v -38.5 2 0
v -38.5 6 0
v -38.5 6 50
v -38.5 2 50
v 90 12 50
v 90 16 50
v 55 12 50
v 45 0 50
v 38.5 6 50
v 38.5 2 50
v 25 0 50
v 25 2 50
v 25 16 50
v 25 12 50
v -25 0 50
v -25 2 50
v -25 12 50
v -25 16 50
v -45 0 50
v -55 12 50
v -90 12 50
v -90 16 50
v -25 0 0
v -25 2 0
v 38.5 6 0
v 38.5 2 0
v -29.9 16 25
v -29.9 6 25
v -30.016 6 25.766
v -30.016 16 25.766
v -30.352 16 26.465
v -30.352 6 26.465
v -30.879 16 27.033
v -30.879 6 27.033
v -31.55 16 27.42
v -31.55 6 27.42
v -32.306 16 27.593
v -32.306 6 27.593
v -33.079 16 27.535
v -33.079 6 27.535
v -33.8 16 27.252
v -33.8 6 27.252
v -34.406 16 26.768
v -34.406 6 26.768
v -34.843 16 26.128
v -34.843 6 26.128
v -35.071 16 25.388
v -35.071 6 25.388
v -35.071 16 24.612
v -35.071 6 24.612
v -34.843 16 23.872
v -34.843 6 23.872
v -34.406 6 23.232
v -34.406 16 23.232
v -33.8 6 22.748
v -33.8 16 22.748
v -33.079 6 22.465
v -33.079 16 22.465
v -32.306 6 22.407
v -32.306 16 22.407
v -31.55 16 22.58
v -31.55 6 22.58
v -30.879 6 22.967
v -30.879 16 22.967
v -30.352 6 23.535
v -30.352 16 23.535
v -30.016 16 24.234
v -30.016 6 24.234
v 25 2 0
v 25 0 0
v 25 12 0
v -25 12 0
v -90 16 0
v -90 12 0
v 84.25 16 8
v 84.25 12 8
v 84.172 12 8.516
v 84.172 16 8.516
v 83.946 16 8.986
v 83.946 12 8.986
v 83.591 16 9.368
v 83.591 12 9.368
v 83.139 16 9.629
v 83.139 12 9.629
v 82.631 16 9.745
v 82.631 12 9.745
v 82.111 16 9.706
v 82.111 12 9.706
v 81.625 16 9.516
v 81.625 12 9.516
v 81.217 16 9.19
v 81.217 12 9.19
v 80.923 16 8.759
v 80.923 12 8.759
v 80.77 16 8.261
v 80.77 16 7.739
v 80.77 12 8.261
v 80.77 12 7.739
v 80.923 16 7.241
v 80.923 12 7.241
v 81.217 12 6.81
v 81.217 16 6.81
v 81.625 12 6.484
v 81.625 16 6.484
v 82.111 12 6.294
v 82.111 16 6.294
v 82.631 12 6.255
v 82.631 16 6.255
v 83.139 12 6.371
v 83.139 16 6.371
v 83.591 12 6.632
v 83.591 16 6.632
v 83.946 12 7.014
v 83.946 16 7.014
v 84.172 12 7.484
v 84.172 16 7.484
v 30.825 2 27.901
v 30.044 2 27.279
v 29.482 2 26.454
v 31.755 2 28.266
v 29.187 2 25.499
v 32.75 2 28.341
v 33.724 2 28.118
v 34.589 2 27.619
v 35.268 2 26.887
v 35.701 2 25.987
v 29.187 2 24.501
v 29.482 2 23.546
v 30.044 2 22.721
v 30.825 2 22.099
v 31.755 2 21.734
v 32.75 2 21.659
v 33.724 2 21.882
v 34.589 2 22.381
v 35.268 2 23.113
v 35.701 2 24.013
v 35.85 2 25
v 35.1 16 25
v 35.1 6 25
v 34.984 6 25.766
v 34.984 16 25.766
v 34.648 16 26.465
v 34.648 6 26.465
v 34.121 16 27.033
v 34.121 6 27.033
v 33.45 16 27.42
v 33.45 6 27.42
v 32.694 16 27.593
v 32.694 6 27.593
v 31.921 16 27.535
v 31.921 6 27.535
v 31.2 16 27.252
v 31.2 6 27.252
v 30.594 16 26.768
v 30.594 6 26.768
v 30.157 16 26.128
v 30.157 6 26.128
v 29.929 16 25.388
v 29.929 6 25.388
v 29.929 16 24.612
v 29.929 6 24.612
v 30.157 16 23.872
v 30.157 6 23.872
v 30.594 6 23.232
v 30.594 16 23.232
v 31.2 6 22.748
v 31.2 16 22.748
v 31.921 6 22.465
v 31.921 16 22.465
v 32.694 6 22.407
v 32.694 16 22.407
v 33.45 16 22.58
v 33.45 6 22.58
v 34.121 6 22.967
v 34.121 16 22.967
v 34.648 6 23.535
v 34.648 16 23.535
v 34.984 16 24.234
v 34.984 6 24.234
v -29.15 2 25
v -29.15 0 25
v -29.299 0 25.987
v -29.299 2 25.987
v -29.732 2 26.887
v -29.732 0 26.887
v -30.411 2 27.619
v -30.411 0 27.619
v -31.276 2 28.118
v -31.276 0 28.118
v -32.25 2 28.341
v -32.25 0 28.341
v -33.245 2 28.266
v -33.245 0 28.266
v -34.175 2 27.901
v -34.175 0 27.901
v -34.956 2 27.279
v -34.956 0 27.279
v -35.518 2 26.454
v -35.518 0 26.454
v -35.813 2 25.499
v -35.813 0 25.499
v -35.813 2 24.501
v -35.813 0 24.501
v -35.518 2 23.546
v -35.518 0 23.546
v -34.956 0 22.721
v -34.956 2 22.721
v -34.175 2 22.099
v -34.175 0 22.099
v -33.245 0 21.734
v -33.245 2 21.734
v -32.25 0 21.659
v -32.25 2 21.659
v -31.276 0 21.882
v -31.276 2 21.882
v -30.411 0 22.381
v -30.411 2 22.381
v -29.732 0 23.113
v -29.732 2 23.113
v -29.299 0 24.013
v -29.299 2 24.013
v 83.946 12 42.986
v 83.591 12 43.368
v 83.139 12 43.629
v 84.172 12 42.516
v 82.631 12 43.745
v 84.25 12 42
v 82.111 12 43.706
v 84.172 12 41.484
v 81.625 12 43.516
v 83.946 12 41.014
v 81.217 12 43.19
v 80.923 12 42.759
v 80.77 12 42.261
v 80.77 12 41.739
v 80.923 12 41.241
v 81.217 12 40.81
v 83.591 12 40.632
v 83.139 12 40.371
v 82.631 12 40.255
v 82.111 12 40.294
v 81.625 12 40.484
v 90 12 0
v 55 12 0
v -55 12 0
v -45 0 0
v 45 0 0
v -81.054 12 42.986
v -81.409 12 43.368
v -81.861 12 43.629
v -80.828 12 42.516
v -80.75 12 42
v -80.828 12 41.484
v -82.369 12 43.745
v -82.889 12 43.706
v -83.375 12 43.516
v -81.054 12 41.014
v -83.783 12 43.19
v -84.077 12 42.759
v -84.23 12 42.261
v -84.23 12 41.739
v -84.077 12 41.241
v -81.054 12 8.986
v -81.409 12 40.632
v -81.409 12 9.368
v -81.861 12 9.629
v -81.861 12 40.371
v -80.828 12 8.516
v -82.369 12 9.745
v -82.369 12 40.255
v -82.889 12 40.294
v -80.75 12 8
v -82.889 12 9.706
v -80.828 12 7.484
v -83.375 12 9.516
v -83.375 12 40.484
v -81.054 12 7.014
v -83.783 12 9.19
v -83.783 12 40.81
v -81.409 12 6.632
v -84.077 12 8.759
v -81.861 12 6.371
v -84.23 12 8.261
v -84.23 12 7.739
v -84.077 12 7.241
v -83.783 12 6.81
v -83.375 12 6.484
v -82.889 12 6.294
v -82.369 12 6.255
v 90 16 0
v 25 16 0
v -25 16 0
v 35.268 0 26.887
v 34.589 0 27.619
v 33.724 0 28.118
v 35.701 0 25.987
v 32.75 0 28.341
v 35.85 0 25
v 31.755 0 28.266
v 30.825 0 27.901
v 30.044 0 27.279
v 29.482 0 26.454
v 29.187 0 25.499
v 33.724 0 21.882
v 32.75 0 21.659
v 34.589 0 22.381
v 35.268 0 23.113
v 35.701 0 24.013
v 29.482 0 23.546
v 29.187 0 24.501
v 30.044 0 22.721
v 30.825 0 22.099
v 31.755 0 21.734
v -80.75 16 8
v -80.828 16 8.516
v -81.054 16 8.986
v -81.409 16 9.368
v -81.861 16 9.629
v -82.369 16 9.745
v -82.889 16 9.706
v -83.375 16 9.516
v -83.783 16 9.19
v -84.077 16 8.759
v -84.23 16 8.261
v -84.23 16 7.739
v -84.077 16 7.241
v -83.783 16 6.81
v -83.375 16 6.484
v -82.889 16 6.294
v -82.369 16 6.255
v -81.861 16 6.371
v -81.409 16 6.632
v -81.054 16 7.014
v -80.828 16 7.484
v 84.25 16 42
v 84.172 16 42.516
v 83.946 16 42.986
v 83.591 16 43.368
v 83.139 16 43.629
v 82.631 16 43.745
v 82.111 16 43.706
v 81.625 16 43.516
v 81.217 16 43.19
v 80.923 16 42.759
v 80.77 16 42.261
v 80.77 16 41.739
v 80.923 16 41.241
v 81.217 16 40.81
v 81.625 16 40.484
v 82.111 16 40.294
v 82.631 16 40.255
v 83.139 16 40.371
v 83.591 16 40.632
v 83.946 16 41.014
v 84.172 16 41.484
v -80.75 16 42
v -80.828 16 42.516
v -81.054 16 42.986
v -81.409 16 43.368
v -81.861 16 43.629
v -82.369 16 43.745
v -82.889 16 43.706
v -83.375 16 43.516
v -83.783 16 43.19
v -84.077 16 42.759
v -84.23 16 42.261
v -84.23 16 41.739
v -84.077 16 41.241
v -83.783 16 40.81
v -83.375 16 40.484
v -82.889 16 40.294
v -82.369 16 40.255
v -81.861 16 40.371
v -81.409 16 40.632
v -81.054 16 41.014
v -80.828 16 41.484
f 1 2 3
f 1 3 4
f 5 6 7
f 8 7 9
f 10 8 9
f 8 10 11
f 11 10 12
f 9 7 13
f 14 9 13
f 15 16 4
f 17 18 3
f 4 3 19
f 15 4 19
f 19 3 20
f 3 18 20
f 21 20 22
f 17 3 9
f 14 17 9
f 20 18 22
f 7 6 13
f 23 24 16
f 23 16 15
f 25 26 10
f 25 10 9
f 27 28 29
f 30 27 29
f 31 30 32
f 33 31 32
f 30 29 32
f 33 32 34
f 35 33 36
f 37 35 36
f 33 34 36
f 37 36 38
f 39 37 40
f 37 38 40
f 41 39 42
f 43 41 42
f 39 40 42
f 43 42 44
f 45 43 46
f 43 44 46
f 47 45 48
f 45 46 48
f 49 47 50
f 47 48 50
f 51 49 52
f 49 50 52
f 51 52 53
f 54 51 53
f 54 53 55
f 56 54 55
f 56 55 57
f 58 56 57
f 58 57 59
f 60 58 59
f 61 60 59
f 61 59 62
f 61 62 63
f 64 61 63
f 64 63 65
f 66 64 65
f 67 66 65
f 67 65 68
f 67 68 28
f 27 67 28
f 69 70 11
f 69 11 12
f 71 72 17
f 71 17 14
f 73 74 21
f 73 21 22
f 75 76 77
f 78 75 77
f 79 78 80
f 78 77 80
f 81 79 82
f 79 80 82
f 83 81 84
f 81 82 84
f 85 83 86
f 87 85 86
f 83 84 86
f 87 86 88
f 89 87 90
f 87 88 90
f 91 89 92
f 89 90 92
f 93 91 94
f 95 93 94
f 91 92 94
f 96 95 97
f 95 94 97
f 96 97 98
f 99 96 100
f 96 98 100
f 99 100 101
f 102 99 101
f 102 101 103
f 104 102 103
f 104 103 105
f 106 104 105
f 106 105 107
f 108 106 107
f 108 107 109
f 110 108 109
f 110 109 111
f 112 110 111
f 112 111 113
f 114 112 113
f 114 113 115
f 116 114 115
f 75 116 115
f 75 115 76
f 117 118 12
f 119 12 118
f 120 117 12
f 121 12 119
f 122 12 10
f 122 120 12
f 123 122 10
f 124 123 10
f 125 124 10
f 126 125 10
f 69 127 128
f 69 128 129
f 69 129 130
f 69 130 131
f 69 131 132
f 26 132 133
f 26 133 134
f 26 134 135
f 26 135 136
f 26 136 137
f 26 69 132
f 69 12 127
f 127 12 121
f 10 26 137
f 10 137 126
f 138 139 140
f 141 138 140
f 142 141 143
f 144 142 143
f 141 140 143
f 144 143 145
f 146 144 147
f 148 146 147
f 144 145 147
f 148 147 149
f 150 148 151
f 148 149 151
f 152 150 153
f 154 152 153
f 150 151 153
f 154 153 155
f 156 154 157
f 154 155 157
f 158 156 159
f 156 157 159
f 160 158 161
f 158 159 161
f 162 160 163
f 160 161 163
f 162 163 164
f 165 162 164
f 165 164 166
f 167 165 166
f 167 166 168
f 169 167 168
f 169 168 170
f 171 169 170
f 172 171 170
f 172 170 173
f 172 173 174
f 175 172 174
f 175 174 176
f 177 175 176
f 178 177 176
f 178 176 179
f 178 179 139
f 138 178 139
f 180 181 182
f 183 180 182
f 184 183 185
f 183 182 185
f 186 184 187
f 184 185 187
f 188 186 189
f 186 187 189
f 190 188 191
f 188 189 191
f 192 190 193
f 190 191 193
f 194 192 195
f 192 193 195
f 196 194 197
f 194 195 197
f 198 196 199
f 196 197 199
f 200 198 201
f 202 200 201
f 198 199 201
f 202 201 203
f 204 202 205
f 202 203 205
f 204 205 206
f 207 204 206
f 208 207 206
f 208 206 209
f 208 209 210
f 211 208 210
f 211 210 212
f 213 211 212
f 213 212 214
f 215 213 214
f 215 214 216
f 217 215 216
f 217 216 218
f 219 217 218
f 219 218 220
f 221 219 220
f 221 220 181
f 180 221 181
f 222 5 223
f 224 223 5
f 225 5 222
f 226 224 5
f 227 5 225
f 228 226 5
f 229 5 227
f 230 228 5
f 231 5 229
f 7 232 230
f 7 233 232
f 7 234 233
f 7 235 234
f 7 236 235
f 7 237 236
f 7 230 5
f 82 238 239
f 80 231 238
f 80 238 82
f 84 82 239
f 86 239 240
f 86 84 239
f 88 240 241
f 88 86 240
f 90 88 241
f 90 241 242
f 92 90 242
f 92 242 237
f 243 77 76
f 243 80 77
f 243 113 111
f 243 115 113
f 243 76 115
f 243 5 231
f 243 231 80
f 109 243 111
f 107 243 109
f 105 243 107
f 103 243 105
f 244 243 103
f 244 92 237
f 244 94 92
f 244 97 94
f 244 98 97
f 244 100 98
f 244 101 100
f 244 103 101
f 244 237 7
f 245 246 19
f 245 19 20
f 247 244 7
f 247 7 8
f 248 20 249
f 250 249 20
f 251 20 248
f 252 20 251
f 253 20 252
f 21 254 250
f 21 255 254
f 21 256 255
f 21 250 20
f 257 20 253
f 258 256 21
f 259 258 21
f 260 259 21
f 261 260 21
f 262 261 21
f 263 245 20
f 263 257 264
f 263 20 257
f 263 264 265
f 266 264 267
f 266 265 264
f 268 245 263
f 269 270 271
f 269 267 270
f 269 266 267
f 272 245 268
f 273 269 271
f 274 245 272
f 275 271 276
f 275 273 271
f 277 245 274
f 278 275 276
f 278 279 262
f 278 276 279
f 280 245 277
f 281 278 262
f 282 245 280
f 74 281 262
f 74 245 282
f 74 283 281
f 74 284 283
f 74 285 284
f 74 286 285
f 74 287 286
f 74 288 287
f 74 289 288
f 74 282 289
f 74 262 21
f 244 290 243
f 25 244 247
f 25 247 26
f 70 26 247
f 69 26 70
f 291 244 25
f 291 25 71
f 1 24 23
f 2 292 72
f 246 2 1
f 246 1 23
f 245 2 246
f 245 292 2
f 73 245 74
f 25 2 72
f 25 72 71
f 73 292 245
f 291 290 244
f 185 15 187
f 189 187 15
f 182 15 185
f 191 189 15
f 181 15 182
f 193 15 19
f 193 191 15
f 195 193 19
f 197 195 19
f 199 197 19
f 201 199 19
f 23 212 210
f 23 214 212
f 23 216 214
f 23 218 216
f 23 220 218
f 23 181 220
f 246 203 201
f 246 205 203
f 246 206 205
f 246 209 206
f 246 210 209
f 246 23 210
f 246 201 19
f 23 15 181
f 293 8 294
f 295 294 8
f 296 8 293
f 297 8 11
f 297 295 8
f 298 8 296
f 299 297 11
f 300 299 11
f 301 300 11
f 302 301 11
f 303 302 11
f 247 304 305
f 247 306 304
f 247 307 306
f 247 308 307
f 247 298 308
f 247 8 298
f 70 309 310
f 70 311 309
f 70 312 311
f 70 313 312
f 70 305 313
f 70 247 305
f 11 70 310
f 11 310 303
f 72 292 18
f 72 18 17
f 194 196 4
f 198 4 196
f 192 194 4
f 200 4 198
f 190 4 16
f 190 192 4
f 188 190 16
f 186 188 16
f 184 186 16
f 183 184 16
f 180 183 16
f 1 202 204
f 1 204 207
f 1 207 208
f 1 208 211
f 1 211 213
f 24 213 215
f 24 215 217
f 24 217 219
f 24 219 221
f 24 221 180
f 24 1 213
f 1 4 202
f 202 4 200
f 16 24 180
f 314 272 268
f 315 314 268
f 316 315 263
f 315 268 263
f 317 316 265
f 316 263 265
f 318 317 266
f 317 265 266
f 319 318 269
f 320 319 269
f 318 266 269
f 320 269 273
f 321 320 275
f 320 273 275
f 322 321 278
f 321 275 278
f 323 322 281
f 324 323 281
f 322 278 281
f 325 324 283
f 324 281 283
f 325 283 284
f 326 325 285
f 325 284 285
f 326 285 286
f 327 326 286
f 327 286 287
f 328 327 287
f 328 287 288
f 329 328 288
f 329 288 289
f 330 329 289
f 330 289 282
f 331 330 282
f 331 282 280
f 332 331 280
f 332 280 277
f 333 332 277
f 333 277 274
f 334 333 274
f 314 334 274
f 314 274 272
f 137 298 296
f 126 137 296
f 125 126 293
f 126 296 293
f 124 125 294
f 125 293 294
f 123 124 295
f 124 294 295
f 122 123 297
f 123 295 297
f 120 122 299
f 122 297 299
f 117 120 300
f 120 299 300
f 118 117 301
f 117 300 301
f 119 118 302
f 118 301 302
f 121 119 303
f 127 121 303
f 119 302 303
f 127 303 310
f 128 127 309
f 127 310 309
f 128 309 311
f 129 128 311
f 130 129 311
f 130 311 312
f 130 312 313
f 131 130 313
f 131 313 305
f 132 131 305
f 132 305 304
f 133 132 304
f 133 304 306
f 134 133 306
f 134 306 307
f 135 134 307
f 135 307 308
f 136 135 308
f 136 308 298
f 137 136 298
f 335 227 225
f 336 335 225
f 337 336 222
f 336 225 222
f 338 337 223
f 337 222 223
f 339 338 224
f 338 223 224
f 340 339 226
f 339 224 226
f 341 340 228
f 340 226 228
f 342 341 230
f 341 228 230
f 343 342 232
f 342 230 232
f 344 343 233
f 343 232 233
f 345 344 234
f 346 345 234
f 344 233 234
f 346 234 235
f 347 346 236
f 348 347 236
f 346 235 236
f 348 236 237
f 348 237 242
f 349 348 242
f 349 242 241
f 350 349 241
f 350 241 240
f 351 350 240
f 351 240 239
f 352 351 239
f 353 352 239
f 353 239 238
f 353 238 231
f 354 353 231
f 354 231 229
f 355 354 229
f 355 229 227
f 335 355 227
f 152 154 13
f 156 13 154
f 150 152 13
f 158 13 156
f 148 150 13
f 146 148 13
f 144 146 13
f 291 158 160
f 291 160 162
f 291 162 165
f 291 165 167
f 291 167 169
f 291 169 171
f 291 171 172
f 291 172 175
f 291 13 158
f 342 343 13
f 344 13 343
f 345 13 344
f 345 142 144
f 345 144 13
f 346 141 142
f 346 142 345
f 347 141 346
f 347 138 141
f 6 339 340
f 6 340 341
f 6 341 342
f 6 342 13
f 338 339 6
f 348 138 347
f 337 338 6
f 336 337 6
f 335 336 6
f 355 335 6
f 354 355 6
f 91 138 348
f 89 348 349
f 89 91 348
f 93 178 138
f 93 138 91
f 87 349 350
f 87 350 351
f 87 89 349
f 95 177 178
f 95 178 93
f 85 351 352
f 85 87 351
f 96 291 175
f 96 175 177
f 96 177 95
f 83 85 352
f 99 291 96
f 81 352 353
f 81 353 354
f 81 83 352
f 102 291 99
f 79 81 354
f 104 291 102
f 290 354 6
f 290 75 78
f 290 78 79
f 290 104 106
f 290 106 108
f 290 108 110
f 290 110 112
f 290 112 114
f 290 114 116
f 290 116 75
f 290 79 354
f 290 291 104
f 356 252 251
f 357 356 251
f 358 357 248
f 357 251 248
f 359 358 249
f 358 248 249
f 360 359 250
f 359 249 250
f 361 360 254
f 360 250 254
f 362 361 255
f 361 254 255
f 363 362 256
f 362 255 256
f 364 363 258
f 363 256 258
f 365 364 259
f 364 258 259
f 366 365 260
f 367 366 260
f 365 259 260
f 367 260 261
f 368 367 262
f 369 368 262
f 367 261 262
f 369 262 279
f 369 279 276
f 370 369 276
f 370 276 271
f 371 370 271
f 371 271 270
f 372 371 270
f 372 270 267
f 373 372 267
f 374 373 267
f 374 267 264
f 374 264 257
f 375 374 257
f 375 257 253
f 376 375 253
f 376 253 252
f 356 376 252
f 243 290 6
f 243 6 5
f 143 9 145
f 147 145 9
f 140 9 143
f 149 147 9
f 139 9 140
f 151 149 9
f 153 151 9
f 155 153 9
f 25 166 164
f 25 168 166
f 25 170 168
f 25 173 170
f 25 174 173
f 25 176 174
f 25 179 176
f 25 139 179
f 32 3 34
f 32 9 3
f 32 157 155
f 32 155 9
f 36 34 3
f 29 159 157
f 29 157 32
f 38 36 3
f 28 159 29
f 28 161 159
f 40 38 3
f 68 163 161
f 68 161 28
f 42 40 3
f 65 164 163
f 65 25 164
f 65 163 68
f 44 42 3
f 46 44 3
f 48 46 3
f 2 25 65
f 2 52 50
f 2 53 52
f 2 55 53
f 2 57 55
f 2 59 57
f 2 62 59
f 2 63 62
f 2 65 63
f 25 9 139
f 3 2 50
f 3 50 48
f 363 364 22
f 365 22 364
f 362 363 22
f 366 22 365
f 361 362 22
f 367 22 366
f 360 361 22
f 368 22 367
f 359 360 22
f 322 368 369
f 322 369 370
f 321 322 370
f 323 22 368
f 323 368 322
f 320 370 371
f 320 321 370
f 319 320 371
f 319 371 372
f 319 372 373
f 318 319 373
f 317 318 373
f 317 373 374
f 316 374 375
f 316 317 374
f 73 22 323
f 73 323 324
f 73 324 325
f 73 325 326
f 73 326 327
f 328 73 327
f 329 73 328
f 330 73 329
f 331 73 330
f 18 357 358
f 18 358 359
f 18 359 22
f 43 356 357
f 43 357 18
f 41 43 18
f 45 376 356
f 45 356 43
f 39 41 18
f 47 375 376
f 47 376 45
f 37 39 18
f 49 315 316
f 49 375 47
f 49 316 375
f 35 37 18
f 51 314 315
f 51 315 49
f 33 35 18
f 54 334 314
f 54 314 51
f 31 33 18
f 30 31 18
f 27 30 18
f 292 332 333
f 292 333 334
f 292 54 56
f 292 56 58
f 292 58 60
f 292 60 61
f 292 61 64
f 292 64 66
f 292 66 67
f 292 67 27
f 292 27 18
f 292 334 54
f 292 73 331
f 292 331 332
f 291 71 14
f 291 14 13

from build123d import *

# Parameters (mm, degrees)
SKETCH001_AS_DRAWN_R                 = 1.75
SKETCH001_AS_DRAWN_R_2               = 2.6
EXTRUDE003_DEPTH                     = 25
EXTRUDE003_ONTO_SKETCH001_ROLL_ANGLE = 90
SKETCH002_AS_DRAWN_R                 = 3.35
EXTRUDE002_DEPTH                     = 3
EXTRUDE002_ONTO_SKETCH002_ROLL_ANGLE = 90
EXTRUDE_DEPTH                        = 50


with BuildPart() as extrude003:
    # Sketch001 as drawn → Extrude003 (new)
    with BuildSketch(Plane.XY):
        with Locations((-82.5, -17)):
            Circle(SKETCH001_AS_DRAWN_R)
        with Locations((82.5, 17)):
            Circle(SKETCH001_AS_DRAWN_R)
        with Locations((82.5, -17)):
            Circle(SKETCH001_AS_DRAWN_R)
        with Locations((-32.5, 0)):
            Circle(SKETCH001_AS_DRAWN_R_2)
        with Locations((32.5, 0)):
            Circle(SKETCH001_AS_DRAWN_R_2)
        with Locations((-82.5, 17)):
            Circle(SKETCH001_AS_DRAWN_R)
    extrude(amount=-EXTRUDE003_DEPTH)


with BuildPart() as extrude003_1:
    # Extrude003 onto Sketch001 roll: moved
    add(extrude003.part.rotate(Axis((0, 0, 0), (1, 0, 0)), EXTRUDE003_ONTO_SKETCH001_ROLL_ANGLE))


with BuildPart() as extrude003_2:
    # Extrude003 onto Sketch001 placement: moved
    add(extrude003_1.part.moved(Location((0, 0, 25))))


with BuildPart() as fusion:
    # Sketch002 as drawn → Extrude002 (new)
    with BuildSketch(Plane.XY):
        with Locations((-32.5, 0)):
            Circle(SKETCH002_AS_DRAWN_R)
        with Locations((32.5, 0)):
            Circle(SKETCH002_AS_DRAWN_R)
    extrude(amount=-EXTRUDE002_DEPTH)


with BuildPart() as fusion_1:
    # Extrude002 onto Sketch002 roll: moved
    add(fusion.part.rotate(Axis((0, 0, 0), (1, 0, 0)), EXTRUDE002_ONTO_SKETCH002_ROLL_ANGLE))


with BuildPart() as fusion_2:
    # Extrude002 onto Sketch002 placement: moved
    add(fusion_1.part.moved(Location((0, 0, 25))))

    # Fusion: union Extrude003
    add(extrude003_2.part)


with BuildPart() as cut:
    # Sketch → Extrude (new body)
    with BuildSketch(Plane.XY):
        Polygon((90, 16), (90, 12), (55, 12), (45, 0), (25, 0), (25, 2), (38.5, 2), (38.5, 6), (-38.5, 6), (-38.5, 2), (-25, 2), (-25, 0), (-45, 0), (-55, 12), (-90, 12), (-90, 16), (-25, 16), (-25, 12), (25, 12), (25, 16), align=None)
    extrude(amount=EXTRUDE_DEPTH)

    # Cut: cut Fusion
    add(fusion_2.part, mode=Mode.SUBTRACT)


solid = cut.part
